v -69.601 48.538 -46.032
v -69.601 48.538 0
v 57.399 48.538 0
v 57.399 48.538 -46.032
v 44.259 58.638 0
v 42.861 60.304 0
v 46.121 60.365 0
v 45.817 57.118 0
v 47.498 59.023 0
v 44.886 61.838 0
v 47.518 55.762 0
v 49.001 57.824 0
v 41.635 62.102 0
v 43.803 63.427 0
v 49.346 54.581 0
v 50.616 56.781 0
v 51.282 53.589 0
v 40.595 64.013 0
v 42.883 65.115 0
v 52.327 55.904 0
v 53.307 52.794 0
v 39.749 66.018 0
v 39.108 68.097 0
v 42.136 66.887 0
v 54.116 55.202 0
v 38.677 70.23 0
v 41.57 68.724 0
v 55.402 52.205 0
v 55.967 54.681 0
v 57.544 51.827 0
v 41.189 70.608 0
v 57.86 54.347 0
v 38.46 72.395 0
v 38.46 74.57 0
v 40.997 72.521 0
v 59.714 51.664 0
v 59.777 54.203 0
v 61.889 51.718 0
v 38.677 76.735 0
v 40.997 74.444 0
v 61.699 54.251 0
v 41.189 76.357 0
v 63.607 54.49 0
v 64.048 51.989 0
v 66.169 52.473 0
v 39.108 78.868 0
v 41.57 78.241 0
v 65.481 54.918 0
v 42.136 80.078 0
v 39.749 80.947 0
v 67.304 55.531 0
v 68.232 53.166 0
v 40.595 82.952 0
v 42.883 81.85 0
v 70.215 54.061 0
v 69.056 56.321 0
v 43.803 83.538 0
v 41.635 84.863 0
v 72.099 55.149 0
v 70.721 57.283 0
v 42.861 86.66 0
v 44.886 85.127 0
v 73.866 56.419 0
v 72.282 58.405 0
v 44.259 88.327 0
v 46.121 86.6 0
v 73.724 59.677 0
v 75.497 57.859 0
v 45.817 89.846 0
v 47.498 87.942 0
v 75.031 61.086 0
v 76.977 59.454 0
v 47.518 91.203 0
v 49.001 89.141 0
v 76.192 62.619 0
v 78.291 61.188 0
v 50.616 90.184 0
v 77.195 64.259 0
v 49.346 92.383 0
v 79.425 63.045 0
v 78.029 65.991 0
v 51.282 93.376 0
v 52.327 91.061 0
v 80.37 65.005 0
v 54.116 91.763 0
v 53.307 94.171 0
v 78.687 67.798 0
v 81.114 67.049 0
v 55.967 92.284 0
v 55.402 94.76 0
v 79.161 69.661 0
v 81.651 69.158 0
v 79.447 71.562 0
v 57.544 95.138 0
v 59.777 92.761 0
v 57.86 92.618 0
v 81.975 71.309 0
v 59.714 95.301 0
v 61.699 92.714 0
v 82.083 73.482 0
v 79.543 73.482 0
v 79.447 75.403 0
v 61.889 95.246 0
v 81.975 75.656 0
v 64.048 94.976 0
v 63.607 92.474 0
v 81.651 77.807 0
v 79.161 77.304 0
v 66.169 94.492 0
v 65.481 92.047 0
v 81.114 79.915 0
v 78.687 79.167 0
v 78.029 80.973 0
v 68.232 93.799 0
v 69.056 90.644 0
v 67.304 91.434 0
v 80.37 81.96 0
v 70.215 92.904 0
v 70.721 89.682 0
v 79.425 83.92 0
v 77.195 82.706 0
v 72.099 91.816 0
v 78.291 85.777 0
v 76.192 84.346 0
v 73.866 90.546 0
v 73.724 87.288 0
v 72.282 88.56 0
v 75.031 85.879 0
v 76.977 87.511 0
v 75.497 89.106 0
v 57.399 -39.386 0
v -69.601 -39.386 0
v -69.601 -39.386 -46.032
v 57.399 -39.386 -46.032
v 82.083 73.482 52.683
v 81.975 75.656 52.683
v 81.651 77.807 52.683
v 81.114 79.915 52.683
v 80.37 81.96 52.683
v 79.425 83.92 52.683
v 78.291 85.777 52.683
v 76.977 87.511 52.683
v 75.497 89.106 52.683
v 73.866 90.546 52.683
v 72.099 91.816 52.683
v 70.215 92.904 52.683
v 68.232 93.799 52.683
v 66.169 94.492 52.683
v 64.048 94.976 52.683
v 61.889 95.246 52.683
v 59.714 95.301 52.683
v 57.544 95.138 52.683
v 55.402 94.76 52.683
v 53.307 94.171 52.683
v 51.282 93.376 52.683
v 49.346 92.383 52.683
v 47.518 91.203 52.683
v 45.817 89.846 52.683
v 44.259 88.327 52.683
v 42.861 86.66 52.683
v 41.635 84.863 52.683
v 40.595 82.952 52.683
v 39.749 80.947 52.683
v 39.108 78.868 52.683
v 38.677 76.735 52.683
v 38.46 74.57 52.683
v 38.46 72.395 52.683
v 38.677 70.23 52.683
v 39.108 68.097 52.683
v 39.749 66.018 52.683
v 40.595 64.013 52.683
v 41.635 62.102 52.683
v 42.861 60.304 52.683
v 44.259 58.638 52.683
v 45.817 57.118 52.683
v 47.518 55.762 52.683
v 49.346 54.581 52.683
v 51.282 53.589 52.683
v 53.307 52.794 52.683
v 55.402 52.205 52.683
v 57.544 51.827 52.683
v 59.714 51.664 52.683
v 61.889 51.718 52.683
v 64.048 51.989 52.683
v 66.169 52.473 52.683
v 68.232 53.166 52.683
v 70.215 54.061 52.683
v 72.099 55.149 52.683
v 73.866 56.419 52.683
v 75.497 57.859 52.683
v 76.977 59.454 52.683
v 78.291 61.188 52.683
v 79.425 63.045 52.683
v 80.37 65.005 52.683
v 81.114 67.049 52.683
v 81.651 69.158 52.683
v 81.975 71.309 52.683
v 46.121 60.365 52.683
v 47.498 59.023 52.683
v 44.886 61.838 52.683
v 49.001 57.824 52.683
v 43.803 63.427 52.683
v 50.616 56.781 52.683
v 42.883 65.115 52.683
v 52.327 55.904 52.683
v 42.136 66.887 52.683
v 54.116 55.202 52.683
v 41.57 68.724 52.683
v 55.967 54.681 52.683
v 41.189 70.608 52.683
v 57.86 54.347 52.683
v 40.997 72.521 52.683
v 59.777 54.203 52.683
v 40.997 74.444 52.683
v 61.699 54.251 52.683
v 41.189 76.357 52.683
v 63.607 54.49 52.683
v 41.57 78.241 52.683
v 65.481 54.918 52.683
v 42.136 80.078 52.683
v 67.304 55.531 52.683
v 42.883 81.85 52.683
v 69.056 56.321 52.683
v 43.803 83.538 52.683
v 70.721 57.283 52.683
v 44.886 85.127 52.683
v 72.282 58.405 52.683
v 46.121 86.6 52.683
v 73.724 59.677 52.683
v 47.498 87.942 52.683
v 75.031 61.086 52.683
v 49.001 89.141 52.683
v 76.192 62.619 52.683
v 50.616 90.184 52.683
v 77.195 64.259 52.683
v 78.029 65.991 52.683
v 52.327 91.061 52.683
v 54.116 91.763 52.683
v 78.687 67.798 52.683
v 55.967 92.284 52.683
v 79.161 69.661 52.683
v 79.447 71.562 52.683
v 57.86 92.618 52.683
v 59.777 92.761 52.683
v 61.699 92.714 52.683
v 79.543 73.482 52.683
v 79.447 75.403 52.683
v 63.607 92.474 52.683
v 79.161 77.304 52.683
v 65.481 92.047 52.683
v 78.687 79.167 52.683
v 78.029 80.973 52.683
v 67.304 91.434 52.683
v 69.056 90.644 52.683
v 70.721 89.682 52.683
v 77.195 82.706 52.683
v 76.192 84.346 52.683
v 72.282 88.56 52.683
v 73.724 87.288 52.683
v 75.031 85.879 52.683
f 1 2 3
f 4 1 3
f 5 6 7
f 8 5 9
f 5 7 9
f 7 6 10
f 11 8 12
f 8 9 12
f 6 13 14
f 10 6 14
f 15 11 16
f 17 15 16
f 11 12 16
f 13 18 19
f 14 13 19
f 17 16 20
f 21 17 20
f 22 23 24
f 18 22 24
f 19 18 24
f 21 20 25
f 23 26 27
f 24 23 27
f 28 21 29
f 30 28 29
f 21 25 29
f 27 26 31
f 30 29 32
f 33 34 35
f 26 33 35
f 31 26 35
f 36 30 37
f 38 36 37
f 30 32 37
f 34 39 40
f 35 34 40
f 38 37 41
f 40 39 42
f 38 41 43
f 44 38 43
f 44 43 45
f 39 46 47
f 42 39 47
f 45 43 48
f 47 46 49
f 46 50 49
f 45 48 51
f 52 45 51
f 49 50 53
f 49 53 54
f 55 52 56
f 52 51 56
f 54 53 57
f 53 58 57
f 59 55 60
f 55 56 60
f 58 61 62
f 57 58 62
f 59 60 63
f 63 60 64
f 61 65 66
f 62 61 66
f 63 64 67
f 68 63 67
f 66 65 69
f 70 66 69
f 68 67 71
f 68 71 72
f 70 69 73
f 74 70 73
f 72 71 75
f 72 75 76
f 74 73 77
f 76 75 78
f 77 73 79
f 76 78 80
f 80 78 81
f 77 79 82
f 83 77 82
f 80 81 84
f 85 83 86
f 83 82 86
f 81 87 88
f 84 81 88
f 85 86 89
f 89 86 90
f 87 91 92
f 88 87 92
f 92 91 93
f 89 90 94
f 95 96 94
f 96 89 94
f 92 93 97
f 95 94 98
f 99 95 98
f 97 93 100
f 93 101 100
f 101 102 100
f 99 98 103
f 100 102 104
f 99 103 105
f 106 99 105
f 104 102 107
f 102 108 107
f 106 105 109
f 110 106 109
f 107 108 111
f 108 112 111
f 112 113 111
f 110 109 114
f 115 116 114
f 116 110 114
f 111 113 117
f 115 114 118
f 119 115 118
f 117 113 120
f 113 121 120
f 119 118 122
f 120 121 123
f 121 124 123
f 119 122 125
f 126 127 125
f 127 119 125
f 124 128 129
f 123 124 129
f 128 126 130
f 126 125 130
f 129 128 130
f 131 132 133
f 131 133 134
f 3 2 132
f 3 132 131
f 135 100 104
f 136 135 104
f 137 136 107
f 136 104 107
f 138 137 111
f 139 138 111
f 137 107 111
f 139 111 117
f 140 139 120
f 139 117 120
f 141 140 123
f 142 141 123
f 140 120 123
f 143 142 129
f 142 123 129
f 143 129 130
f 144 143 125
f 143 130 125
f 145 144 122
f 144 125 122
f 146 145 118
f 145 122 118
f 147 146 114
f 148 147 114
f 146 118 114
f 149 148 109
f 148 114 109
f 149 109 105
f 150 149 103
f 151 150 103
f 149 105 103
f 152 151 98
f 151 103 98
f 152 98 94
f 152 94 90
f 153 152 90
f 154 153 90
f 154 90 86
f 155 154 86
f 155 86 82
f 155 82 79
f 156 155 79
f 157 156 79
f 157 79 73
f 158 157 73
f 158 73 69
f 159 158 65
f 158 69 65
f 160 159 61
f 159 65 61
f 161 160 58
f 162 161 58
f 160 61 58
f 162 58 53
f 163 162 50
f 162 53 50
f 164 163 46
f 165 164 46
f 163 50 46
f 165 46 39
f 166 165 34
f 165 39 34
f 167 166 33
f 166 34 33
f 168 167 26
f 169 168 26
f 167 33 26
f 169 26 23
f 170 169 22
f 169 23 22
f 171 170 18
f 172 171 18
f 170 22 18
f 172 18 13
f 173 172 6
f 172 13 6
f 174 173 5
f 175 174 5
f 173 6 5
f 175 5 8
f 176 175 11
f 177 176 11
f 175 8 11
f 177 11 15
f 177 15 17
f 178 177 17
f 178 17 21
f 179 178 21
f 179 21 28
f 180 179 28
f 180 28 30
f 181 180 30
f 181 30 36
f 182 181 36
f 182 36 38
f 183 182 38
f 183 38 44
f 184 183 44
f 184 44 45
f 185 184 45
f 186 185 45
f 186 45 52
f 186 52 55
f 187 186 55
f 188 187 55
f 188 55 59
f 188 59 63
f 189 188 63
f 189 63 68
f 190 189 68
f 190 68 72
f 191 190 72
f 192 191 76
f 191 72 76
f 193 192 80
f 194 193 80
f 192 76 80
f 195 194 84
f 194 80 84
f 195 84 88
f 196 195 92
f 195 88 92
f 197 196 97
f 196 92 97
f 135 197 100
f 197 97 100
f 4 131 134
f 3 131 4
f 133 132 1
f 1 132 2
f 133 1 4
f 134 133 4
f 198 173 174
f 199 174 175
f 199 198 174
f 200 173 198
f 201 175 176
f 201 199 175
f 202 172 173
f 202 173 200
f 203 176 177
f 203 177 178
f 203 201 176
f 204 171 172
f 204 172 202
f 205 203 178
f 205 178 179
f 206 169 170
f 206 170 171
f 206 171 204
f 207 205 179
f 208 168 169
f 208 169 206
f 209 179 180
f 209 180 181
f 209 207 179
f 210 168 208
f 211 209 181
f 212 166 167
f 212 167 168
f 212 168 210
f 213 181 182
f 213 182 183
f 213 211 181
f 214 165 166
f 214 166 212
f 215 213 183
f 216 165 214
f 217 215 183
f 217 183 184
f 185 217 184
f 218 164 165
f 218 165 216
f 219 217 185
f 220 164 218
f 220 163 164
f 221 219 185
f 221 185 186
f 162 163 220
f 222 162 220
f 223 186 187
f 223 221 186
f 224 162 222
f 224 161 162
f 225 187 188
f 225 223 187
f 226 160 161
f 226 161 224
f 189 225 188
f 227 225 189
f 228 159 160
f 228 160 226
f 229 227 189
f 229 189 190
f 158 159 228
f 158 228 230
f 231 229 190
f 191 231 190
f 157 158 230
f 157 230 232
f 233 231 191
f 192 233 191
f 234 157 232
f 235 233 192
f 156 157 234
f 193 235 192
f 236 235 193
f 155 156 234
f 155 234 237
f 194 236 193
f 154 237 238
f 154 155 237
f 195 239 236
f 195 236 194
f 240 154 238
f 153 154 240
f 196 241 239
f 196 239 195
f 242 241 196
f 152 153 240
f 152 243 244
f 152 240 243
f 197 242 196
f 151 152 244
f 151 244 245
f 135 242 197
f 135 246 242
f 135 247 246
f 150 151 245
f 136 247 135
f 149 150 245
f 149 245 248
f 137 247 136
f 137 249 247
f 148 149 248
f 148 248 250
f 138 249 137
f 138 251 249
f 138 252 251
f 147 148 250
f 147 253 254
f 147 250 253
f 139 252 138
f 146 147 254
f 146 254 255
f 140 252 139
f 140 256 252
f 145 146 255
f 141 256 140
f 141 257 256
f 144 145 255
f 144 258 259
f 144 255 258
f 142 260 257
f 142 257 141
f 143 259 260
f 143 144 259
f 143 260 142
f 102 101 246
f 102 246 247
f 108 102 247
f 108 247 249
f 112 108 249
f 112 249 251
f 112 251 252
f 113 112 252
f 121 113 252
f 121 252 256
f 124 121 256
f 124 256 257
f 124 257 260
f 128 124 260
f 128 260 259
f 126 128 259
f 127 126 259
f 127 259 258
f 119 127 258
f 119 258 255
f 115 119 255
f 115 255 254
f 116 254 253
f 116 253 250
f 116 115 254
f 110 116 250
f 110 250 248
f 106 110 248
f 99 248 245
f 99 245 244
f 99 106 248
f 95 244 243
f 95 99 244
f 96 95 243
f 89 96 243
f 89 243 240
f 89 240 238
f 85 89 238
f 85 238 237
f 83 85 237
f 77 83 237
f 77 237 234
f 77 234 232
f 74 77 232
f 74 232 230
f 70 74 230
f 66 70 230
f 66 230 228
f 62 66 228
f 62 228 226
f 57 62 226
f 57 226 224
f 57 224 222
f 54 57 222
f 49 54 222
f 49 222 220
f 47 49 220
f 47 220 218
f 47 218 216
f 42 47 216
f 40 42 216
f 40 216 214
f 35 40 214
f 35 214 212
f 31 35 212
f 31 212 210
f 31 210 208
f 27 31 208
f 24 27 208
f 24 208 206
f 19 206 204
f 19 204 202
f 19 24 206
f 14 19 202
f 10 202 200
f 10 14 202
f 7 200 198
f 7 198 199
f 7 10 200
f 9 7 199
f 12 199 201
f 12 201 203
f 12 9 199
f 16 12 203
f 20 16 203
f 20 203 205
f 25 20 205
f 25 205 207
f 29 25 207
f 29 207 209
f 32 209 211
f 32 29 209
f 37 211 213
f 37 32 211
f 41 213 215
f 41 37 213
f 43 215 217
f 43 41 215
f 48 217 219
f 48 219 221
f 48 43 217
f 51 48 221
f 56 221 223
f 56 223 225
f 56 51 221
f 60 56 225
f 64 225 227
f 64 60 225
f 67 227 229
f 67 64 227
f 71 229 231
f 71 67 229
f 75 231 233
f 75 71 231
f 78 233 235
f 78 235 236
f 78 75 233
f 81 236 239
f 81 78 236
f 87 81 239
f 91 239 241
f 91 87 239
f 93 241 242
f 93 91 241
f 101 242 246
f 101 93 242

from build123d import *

# Parameters (mm, degrees)
F0_W     = 127
F0_H     = 87.92308
F1_DEPTH = 46.03194
F2_R     = 21.825015
F3_DEPTH = 52.68303
F4_T     = -2.54


with BuildPart() as f1:
    # F0 (on Top) → F1 (new body)
    with BuildSketch(Plane.XY):
        with Locations((-6.101284, 4.575962)):
            Rectangle(F0_W, F0_H)
    extrude(amount=-F1_DEPTH)


with BuildPart() as f3:
    # F2 (on Top) → F3 (new body)
    with BuildSketch(Plane.XY):
        with Locations((60.258288, 73.482439)):
            Circle(F2_R)
    extrude(amount=F3_DEPTH)

    # F4
    f4_openings = [f3.faces().sort_by_distance(p)[0] for p in [
        (60.258288, 73.482439, 52.68303),
        (60.258288, 73.482439, 0),
    ]]
    offset(amount=F4_T, openings=f4_openings)


solid = Compound([f1.part, f3.part])
